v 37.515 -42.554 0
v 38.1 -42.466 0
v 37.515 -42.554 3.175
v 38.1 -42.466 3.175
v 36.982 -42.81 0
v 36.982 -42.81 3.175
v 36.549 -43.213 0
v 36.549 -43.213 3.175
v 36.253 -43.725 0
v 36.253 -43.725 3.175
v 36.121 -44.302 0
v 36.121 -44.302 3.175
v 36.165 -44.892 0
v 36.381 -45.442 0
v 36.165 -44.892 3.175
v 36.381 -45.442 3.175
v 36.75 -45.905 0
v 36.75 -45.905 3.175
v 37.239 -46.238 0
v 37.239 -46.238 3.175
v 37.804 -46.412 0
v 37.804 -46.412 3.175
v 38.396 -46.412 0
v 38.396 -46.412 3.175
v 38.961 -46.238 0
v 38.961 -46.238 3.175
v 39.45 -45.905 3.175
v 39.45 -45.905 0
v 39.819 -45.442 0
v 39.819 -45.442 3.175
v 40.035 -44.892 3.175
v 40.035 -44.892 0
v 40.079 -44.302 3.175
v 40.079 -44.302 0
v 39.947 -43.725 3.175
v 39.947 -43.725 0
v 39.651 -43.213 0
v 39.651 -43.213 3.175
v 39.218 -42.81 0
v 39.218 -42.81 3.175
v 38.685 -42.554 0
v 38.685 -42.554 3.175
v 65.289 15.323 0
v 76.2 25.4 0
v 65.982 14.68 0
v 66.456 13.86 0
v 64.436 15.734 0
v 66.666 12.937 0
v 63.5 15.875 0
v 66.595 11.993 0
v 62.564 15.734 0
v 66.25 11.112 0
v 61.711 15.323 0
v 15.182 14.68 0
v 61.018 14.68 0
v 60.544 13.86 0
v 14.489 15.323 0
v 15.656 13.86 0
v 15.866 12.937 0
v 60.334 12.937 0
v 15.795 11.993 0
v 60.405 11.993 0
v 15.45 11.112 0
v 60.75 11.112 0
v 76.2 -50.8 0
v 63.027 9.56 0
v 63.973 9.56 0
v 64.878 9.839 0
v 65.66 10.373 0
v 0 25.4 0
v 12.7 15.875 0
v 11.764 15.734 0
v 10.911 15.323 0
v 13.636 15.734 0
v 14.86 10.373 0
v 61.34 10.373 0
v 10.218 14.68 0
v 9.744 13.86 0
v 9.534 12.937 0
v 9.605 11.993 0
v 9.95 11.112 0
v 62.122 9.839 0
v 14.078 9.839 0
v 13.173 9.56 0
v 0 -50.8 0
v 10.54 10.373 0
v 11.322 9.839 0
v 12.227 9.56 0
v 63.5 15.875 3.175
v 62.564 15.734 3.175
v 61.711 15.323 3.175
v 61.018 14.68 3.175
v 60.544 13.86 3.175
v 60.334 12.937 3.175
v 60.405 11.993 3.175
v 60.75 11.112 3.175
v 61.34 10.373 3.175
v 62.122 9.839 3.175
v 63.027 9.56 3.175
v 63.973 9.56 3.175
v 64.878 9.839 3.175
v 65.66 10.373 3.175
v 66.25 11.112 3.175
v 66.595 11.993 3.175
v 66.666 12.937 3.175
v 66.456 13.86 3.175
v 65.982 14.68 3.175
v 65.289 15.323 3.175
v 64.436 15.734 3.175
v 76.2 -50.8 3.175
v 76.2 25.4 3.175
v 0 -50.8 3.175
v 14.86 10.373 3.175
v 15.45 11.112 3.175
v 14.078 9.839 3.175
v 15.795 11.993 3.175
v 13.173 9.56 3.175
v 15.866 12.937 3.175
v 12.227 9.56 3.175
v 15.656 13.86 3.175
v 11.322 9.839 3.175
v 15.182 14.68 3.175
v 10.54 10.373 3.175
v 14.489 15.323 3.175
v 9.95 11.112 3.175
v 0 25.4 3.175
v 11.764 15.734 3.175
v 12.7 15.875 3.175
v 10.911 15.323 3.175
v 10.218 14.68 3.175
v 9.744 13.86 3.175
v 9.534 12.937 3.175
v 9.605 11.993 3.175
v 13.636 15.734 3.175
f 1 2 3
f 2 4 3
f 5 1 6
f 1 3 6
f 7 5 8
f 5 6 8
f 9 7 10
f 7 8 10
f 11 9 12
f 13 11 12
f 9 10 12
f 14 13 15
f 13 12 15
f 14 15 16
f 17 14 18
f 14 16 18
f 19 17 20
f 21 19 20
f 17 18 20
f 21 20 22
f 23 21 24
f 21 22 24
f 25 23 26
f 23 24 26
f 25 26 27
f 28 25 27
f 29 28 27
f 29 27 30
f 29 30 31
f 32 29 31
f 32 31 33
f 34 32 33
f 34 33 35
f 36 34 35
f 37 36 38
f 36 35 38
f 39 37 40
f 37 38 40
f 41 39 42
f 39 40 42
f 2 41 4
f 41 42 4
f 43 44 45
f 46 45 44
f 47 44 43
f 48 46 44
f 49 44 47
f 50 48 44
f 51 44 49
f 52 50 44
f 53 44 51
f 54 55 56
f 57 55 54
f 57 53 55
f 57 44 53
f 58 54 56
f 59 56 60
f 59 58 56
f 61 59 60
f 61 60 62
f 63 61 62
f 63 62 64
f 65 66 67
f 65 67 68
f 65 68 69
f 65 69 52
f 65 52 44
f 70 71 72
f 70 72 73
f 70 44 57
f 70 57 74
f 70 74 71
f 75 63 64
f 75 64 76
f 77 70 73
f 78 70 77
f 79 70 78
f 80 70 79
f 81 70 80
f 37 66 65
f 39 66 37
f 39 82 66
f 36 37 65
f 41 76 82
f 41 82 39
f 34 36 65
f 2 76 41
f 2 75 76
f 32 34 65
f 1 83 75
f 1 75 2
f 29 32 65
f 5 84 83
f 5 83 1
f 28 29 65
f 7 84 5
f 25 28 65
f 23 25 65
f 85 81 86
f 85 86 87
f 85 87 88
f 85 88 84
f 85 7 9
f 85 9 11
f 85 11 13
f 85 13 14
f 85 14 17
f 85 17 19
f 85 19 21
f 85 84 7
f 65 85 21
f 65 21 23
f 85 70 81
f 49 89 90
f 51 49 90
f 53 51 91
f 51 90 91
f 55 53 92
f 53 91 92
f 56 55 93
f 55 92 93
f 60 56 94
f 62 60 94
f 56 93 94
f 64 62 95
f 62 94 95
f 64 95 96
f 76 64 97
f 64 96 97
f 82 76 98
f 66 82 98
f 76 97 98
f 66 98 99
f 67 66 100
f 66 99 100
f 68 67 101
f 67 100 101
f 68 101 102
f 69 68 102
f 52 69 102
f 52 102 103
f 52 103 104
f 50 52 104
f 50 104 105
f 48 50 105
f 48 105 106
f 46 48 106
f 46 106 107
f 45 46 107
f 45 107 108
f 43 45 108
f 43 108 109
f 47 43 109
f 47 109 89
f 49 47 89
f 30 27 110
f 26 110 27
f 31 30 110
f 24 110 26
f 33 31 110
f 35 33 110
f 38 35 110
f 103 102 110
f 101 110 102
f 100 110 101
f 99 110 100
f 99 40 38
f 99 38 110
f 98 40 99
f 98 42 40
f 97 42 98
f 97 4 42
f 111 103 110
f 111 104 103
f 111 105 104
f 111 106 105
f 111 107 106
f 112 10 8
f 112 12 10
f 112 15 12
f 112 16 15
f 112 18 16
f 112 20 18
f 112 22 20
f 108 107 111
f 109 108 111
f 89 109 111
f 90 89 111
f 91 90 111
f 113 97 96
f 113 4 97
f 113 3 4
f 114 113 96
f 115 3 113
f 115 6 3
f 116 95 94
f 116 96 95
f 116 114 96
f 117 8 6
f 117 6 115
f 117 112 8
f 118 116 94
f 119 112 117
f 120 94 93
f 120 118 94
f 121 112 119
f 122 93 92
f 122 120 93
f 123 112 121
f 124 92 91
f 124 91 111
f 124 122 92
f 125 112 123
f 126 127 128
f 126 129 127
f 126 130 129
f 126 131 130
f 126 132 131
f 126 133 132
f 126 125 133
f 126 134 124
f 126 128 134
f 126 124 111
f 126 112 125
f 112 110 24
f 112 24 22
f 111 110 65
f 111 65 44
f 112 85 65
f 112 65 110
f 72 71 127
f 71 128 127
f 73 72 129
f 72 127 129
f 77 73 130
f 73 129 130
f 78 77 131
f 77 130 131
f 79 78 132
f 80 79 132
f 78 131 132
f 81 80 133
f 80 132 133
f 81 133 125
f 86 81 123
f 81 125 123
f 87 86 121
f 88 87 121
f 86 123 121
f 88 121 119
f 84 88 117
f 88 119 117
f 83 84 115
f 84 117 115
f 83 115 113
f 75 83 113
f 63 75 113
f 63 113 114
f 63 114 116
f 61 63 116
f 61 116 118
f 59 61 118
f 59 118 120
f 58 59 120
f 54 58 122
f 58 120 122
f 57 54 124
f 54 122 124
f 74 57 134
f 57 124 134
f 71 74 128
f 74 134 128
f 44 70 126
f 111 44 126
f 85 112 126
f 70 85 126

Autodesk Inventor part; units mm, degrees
ref_plane "YZ Plane" through (0, 0, 0) normal (1, 0, 0) x (0, 1, 0)
ref_plane "XZ Plane" through (0, 0, 0) normal (0, 1, 0) x (-1, 0, 0)
ref_plane "XY Plane" through (0, 0, 0) normal (0, 0, 1) x (1, 0, 0)
sketch "Sketch1" plane through (0, 0, 0) normal (1, 0, 0) x (0, 1, 0)
  line L0 (0, 0) -> (-50.8, 0)
  line L1 (-50.8, 0) -> (-50.8, 3.175)
  line L2 (-50.8, 3.175) -> (0, 3.175)
  line L3 (0, 3.175) -> (0, 0)
  line L4 (0, 0) -> (25.4, 0)
  line L5 (25.4, 0) -> (25.4, 3.175)
  line L6 (25.4, 3.175) -> (0, 3.175)
  line L7 (0, 3.175) -> (0, 0)
  line L8 (0, 0) -> (25.4, 0) construction
  dimension "d0" = 50.8
  dimension "d1" = 3.175
  dimension "d2" = 25.4
  dimension "d3" = 0
  dimension "d4" = 3.175
extrude "Extrusion1" add sketch "Sketch1" along normal blind 76.2
sketch "Sketch2" plane through (76.2, 25.4, 0) normal (0, 0, -1) x (-1, 0, 0)
  line L0 (76.2, 0) -> (0, 0) projected
  line L1 (76.2, -76.2) -> (76.2, 0) projected
  line L2 (0, -76.2) -> (0, 0) projected
  line L3 (76.2, -76.2) -> (0, -76.2) projected
  point P0 (12.7, -12.7)
  point P1 (63.5, -12.7)
hole "Hole1" at (63.5, 12.7, 0) at (12.7, 12.7, 0) direction (0, 0, 1) diameter 6.35 end through all
sketch "Sketch3" plane through (0, -50.8, 0) normal (0, 0, -1) x (-1, 0, 0)
  line L0 (0, 0) -> (0, 76.2) projected
  line L1 (-76.2, 0) -> (-76.2, 76.2) projected
  line L2 (0, 0) -> (-76.2, 0) projected
  line L3 (0, 76.2) -> (-76.2, 76.2) projected
  point P0 (0, 50.8)
  point P1 (-38.1, 6.35)
  dimension "d18" = 6.35
  dimension "d19" = 38.1
hole "Hole2" at (38.1, -44.45, 0) direction (0, 0, 1) diameter 3.9688 end through all
properties part number "camera mount" material "Aluminum 6061"
